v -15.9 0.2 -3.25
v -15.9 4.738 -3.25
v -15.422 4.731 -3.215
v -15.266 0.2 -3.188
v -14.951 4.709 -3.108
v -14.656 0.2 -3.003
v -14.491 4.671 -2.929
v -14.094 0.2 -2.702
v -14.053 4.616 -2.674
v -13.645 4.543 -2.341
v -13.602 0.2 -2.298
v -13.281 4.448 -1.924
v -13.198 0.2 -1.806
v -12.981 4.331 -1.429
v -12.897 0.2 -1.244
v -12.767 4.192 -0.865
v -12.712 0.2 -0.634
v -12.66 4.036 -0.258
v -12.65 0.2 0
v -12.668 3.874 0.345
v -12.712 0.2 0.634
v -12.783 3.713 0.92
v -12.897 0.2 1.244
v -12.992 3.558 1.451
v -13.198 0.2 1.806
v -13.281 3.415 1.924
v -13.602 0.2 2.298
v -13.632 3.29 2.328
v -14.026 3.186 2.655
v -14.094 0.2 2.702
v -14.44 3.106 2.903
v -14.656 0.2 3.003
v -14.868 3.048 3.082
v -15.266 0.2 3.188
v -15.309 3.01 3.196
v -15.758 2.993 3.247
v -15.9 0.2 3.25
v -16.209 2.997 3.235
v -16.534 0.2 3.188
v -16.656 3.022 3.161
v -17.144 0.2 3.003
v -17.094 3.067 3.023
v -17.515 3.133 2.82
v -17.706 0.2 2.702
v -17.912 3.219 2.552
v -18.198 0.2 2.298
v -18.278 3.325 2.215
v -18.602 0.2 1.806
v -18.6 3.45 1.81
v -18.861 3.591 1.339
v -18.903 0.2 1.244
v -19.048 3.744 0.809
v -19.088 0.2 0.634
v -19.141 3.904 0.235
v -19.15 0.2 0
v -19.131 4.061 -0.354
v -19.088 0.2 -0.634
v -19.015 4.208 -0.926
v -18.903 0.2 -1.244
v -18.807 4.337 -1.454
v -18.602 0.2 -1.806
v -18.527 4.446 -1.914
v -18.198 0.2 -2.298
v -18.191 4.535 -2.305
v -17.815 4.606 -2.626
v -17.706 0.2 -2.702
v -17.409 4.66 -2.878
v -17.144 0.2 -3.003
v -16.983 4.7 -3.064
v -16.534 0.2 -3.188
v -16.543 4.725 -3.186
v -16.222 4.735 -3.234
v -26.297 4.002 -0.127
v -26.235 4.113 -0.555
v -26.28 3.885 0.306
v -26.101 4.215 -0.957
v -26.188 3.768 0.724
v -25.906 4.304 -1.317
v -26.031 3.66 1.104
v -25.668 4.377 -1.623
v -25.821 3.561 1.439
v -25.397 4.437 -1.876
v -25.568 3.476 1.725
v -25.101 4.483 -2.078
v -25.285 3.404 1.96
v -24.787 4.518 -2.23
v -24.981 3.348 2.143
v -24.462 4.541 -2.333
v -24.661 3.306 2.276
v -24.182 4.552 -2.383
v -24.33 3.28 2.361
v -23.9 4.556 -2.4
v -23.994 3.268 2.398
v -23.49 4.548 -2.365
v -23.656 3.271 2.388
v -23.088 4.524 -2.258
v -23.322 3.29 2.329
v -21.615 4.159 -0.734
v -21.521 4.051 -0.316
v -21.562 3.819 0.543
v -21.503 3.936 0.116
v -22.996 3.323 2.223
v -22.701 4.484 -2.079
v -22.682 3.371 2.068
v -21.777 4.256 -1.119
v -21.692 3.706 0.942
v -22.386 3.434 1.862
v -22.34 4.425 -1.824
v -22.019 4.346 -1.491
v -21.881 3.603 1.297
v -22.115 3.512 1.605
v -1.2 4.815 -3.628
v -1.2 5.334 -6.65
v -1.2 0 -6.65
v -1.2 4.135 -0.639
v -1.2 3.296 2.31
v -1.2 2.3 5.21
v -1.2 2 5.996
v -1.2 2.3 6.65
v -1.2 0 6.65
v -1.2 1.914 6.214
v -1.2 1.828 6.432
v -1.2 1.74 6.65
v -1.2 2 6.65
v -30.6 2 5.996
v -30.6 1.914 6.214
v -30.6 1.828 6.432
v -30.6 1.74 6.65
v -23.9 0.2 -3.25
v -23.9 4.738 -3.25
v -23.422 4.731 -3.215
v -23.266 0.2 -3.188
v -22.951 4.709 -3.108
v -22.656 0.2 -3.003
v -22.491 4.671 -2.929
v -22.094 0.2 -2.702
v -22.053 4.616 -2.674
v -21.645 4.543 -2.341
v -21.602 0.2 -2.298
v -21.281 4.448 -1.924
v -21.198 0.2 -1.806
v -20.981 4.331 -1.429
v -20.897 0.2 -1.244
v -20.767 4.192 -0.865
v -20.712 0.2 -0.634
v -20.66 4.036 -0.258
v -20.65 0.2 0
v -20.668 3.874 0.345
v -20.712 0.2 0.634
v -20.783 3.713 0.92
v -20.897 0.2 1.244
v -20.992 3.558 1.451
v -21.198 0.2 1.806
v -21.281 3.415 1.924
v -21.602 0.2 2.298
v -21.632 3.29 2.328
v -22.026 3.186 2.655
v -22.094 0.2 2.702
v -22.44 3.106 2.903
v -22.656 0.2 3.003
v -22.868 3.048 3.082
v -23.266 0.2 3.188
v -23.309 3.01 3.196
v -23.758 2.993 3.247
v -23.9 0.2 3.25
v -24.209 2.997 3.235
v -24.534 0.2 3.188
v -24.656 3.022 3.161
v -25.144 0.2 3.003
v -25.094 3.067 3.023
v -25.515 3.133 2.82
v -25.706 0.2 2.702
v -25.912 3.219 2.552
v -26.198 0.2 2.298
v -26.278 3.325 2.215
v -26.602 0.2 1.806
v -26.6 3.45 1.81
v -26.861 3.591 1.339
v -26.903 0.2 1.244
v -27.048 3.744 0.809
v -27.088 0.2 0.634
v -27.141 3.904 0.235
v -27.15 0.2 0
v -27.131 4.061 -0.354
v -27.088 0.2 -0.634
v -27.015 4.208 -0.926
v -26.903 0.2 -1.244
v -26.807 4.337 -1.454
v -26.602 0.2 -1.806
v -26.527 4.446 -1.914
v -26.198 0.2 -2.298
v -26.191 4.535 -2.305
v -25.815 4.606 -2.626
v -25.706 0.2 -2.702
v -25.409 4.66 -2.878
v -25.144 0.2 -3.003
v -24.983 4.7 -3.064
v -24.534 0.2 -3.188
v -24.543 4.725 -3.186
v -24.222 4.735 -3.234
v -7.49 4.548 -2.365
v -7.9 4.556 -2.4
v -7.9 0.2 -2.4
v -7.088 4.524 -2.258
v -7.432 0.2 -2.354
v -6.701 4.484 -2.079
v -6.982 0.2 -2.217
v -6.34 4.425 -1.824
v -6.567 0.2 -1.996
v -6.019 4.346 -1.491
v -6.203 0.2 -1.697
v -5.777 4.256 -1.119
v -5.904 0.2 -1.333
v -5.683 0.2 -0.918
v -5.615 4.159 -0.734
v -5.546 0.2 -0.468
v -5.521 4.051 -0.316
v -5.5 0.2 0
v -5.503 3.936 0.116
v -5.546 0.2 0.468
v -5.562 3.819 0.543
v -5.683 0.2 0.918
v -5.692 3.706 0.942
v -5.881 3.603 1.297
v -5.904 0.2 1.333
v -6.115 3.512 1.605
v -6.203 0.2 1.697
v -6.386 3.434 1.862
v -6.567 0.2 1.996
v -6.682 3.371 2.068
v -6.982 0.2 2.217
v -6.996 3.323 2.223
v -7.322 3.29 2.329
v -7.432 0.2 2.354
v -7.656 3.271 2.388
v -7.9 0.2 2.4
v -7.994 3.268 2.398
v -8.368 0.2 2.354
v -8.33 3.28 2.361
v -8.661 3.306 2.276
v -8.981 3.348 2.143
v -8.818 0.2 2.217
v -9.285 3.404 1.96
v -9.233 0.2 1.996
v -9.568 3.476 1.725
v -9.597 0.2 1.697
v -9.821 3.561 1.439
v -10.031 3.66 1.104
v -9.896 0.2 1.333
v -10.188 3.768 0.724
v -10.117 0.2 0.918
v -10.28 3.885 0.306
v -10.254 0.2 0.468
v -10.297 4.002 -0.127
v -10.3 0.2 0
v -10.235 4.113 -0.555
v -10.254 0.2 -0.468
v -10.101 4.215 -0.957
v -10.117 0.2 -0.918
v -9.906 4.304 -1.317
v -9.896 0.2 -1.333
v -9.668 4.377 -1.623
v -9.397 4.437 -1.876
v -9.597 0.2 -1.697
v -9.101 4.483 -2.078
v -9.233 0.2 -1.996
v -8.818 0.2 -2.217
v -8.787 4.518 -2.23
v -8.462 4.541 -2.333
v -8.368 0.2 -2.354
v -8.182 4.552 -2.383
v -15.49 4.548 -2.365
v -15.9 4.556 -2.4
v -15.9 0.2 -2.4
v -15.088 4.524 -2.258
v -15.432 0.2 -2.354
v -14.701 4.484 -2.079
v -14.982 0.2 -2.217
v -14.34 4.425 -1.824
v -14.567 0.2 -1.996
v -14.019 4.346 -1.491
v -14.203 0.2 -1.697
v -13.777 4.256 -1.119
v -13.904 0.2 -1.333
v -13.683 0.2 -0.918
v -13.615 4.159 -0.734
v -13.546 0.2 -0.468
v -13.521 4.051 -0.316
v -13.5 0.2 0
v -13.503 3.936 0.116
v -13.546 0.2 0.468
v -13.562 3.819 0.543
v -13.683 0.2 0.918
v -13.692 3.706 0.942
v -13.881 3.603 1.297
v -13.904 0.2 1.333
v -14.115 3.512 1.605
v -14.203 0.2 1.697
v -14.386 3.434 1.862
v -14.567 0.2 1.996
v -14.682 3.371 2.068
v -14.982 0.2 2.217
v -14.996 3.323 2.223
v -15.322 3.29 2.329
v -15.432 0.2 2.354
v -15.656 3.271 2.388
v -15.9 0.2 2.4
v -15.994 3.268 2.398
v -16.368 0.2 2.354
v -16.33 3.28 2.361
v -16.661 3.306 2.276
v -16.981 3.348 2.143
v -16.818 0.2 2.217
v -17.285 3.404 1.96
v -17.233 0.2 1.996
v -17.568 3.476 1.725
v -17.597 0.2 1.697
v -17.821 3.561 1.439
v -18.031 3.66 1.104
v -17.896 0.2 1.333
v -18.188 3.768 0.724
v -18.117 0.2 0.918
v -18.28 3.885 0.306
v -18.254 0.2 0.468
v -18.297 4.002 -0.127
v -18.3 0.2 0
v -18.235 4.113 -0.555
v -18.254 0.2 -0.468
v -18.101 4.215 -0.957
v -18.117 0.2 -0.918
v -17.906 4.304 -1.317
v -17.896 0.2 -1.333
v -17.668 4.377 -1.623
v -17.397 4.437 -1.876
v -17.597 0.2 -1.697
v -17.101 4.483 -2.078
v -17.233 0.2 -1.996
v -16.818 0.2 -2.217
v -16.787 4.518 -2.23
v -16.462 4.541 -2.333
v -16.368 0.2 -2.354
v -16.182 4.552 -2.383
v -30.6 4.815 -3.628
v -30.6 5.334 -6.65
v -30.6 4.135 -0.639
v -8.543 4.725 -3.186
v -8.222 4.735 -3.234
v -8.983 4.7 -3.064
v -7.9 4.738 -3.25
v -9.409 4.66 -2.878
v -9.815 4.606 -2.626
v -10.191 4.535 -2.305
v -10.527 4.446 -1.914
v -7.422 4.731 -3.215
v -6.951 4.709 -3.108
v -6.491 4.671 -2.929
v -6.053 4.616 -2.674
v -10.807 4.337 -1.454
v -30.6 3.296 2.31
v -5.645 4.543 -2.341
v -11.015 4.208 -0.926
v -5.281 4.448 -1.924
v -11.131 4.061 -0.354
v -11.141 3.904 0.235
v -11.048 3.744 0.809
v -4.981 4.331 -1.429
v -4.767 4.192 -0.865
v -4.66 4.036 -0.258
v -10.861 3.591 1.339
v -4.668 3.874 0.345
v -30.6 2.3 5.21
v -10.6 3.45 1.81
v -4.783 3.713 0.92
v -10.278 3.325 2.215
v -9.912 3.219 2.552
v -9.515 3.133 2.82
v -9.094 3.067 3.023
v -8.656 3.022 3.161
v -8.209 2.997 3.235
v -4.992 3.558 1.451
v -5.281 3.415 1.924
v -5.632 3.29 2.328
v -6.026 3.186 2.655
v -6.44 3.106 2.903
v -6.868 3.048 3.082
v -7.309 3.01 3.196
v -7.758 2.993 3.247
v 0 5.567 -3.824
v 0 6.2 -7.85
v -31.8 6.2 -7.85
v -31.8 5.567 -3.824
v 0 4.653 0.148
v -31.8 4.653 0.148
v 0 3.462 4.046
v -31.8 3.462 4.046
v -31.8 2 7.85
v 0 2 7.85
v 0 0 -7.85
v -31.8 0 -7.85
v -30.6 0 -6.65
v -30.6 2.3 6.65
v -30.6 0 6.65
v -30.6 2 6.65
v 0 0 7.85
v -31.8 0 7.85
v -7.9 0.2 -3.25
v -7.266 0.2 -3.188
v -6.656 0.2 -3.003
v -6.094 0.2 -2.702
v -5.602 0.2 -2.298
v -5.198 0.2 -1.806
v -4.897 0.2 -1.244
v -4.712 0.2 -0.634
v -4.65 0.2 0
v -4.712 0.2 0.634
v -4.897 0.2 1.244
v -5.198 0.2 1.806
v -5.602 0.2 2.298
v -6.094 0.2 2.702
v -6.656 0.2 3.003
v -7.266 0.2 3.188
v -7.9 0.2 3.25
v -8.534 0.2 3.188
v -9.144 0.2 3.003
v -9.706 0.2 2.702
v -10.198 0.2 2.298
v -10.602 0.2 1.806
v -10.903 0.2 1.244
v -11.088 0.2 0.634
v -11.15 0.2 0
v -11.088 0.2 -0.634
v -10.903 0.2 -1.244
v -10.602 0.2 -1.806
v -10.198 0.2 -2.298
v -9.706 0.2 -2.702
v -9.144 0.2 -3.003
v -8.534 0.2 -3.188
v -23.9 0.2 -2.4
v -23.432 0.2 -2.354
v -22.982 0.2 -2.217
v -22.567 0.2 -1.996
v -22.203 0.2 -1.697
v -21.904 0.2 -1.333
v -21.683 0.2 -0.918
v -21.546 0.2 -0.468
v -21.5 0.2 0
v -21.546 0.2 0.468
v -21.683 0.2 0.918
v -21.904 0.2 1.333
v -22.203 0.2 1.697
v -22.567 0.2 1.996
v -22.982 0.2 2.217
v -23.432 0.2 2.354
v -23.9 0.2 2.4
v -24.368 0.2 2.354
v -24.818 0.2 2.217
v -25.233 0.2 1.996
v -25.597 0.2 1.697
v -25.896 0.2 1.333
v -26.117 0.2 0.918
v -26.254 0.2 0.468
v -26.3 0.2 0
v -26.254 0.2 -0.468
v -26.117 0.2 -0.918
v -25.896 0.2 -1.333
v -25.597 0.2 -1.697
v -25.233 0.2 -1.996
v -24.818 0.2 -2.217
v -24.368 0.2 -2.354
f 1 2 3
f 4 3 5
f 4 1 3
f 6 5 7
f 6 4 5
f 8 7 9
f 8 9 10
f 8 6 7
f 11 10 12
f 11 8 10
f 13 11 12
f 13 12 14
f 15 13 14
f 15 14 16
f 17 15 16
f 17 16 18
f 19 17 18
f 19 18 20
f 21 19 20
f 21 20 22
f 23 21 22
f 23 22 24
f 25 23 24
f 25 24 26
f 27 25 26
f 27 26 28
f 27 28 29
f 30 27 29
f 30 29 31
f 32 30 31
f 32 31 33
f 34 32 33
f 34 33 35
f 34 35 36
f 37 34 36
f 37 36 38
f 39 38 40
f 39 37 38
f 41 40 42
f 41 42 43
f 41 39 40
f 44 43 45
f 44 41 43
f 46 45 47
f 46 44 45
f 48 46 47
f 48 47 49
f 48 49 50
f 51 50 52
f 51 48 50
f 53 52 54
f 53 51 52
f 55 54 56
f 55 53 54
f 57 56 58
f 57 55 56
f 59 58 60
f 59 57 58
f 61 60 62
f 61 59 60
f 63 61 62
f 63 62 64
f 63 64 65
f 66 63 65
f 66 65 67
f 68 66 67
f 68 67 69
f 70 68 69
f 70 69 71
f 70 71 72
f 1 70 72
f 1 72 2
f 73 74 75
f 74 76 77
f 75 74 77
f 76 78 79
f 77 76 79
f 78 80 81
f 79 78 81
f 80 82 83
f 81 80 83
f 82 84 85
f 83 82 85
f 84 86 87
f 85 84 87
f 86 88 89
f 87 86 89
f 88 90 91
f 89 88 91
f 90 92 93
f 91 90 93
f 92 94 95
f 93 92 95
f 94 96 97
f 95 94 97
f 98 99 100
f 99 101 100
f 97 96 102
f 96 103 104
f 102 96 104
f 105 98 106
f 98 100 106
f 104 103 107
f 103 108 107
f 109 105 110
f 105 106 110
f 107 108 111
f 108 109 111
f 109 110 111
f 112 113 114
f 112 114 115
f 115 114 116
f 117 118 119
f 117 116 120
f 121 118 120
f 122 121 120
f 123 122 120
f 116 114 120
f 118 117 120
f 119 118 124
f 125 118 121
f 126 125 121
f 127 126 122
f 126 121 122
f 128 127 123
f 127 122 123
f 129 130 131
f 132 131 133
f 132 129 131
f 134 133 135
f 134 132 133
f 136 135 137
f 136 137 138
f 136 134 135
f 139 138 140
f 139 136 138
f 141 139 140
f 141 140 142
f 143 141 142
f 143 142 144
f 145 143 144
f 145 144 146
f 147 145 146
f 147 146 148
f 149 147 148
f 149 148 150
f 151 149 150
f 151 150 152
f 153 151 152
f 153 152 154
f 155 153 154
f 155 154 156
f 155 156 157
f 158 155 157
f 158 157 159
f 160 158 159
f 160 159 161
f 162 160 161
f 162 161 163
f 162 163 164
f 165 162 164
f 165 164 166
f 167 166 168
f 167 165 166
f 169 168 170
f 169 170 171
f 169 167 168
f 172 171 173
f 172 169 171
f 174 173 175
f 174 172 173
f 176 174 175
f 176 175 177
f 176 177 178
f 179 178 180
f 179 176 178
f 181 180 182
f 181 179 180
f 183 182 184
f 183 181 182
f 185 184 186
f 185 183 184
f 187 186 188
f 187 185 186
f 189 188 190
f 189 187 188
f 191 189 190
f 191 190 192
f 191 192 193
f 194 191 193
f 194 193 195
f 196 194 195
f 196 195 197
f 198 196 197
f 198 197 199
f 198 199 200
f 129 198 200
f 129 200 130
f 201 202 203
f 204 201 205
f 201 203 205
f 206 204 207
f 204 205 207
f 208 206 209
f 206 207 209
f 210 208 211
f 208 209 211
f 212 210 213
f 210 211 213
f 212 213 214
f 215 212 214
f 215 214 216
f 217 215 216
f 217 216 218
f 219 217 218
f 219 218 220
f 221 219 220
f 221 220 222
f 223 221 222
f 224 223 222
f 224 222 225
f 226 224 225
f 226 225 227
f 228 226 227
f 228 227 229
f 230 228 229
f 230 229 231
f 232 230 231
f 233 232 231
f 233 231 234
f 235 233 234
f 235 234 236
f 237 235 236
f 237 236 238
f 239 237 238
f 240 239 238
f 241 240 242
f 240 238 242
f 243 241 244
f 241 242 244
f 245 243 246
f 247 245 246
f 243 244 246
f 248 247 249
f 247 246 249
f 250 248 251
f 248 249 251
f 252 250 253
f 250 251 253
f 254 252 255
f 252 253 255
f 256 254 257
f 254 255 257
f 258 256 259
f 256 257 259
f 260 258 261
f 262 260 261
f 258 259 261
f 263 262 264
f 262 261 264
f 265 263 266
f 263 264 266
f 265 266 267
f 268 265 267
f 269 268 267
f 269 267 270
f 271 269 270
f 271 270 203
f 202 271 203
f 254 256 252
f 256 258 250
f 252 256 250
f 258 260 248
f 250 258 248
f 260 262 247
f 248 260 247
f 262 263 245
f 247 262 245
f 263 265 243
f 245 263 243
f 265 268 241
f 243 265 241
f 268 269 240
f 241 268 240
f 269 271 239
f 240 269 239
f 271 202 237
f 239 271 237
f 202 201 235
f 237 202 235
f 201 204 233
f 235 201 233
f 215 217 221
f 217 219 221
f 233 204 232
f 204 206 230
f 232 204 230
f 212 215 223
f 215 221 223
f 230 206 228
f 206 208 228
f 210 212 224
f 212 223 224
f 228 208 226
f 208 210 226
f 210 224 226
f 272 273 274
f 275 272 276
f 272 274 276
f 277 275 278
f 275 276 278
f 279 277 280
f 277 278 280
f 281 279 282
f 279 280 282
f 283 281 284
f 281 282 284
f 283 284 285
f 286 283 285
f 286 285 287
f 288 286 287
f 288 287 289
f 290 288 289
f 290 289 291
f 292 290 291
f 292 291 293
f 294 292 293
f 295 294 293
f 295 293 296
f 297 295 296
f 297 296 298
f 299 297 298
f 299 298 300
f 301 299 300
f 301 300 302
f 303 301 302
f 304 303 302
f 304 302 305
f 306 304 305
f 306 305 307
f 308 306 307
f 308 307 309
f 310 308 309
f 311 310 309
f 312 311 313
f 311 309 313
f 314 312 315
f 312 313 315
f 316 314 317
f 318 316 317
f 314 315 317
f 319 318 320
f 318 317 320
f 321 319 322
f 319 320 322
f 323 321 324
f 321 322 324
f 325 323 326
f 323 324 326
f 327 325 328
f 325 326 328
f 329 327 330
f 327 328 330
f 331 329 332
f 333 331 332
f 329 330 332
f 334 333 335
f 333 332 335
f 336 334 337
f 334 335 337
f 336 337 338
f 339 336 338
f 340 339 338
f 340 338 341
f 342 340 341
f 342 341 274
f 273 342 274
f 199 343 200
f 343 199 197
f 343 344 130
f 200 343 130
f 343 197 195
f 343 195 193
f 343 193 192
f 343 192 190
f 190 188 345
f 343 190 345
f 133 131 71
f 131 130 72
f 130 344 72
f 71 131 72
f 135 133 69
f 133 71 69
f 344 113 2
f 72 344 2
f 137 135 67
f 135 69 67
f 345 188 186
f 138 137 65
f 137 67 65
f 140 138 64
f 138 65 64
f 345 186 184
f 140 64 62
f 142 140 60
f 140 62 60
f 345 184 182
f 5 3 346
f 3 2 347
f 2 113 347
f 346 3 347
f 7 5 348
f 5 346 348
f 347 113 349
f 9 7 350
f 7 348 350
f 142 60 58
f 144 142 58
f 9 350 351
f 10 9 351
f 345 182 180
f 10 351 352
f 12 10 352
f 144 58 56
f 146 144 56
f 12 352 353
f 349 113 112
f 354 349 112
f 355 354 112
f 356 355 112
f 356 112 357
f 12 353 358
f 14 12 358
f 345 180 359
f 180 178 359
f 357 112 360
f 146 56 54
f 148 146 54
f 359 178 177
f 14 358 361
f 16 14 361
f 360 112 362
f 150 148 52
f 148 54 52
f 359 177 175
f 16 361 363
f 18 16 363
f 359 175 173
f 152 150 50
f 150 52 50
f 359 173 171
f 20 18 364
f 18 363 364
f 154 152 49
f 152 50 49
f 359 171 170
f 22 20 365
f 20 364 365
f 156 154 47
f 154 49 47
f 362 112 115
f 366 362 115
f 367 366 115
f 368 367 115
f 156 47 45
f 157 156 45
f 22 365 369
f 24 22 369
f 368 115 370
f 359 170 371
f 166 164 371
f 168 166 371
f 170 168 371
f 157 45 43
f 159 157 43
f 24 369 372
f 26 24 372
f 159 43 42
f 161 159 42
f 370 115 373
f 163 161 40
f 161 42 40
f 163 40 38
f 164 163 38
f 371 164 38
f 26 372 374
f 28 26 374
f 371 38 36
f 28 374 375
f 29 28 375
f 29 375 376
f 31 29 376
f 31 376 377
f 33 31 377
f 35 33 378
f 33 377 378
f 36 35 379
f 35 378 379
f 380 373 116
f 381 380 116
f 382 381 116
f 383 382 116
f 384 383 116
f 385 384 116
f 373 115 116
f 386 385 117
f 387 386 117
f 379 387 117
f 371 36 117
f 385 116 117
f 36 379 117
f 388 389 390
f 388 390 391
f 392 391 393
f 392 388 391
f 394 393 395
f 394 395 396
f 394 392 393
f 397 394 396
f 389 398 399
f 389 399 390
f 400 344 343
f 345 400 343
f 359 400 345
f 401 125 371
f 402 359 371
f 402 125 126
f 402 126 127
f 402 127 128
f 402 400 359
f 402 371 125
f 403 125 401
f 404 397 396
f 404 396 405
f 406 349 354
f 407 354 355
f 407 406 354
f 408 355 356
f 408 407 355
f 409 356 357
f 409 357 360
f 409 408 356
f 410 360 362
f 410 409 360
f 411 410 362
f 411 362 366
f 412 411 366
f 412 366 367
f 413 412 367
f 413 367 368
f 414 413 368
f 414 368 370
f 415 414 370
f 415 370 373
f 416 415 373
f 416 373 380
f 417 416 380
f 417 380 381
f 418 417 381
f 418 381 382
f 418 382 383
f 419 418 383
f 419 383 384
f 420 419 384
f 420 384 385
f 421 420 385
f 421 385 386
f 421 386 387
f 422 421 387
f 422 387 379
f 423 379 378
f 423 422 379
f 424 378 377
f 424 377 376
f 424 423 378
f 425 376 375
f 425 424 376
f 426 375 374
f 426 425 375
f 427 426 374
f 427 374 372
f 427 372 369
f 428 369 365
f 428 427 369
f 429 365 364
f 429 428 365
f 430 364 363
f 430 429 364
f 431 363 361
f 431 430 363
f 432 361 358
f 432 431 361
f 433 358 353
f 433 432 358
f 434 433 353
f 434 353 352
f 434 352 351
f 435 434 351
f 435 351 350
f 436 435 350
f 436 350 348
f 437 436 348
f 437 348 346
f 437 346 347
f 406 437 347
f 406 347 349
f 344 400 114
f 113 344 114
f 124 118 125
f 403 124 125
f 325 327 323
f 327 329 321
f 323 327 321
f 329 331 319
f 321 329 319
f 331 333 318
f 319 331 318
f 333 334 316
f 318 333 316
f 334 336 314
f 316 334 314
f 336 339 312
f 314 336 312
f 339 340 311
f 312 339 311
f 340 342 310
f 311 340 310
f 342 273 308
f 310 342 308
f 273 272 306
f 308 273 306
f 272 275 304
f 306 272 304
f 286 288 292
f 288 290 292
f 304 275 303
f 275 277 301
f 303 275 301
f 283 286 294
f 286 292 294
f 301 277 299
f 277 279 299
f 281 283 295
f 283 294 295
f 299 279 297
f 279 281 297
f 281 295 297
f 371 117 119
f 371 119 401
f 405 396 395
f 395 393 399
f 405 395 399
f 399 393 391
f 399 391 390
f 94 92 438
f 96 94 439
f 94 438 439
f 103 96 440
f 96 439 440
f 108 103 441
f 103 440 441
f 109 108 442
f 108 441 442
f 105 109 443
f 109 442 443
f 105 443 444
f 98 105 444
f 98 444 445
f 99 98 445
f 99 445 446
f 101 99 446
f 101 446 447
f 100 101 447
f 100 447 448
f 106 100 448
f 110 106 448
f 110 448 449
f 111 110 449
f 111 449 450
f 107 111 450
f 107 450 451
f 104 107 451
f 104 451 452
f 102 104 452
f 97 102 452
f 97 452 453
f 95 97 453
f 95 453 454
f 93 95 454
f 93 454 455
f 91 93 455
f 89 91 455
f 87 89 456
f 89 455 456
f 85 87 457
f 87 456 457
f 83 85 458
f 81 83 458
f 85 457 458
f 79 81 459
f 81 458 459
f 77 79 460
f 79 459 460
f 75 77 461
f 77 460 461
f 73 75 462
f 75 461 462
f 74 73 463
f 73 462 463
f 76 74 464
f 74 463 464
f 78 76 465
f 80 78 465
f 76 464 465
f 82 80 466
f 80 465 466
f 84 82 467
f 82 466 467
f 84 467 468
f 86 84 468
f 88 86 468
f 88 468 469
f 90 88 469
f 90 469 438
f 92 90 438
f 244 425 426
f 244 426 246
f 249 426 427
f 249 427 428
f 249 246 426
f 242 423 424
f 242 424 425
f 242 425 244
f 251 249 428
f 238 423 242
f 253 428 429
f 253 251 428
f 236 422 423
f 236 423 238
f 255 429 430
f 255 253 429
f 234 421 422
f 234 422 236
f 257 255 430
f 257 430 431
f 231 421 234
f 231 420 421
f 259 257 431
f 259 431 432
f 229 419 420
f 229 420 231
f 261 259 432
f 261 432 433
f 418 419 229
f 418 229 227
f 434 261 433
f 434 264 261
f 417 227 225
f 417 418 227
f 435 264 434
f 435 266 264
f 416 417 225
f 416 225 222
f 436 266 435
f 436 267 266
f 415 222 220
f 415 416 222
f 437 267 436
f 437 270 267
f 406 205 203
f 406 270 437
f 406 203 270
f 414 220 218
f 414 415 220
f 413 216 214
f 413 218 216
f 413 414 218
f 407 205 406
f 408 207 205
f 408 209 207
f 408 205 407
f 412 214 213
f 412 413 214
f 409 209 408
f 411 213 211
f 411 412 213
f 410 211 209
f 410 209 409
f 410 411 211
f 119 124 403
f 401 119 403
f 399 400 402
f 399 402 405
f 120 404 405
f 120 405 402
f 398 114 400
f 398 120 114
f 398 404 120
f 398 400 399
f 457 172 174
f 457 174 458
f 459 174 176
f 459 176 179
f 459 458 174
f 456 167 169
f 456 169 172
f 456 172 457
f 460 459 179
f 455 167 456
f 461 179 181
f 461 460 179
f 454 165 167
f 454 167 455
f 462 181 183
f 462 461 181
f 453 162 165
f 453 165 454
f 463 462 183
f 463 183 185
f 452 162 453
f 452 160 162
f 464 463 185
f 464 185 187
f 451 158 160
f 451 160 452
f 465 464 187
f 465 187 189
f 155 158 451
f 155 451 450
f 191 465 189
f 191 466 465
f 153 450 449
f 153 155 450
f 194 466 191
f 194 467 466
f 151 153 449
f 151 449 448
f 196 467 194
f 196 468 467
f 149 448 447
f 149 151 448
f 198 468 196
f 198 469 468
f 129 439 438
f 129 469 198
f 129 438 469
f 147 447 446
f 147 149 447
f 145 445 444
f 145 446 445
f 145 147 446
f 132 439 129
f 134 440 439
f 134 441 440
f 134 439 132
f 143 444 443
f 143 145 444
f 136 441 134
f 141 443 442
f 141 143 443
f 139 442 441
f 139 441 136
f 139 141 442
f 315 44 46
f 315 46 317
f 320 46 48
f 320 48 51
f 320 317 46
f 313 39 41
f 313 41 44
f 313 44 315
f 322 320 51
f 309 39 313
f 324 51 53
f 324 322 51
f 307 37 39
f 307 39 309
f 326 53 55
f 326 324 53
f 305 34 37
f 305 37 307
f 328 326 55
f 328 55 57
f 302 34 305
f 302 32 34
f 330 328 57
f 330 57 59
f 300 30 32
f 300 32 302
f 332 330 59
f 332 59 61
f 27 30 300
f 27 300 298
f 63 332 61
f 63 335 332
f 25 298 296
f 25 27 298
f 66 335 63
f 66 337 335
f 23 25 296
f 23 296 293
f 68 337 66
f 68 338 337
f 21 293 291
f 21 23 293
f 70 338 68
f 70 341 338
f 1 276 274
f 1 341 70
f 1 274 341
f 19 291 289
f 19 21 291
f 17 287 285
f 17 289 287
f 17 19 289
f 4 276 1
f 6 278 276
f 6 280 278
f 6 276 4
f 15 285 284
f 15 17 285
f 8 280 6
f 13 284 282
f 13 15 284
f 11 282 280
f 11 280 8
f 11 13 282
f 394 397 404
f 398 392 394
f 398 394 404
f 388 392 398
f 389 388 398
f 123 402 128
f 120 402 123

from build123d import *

# Parameters (mm, degrees)
BOSS_EXTRUDE1_DEPTH      = 31.8
CUT_EXTRUDE1_REACH       = 35.336
CUT_EXTRUDE1_END_RADIUS  = 57.3
SKETCH2_W                = 29.4
SKETCH2_H                = 13.3
BOSS_EXTRUDE2_REACH      = 35.336
BOSS_EXTRUDE2_END_RADIUS = 57.3
SKETCH3_R                = 3.25
SKETCH3_R_2              = 2.4
SKETCH4_R                = 3.25
SKETCH4_R_2              = 2.4
CUT_EXTRUDE2_DEPTH       = 0.2
LPATTERN1_COUNT          = 2
LPATTERN1_PITCH          = 8
LPATTERN2_COUNT          = 2
LPATTERN2_PITCH          = 8
SKETCH5_W                = 29.4
SKETCH5_H                = 2.5
CUT_EXTRUDE3_DEPTH       = 0.3


with BuildPart() as part:
    # Sketch1 → Boss-Extrude1 (new body)
    with BuildSketch(Plane(origin=(0, 0, 0), x_dir=(0, 0, -1), z_dir=(1, 0, 0))):
        with BuildLine():
            Line((-7.85, 0), (7.85, 0))
            Line((7.85, 0), (7.85, 6.2))
            ThreePointArc((7.85, 6.2), (-0.147838397, 4.652634009), (-7.85, 2))
            Line((-7.85, 2), (-7.85, 0))
        make_face()
    extrude(amount=-BOSS_EXTRUDE1_DEPTH)

    # Cut-Extrude1: up to this cylinder (the profile starts inside it)
    cut_extrude1_end = Plane(origin=(-15.9, -51.377128325, -14.841015221), z_dir=(1, 0, 0)) * Cylinder(CUT_EXTRUDE1_END_RADIUS, 186.272, mode=Mode.PRIVATE)
    # Sketch2 → Cut-Extrude1 (cut, up to the surface)
    with BuildSketch(Plane.XZ, mode=Mode.PRIVATE) as cut_extrude1_sk1:
        with Locations((-15.9, 0)):
            Rectangle(SKETCH2_W, SKETCH2_H)
    cut_extrude1_tool1 = extrude(cut_extrude1_sk1.sketch, amount=-CUT_EXTRUDE1_REACH, mode=Mode.PRIVATE) & cut_extrude1_end
    add(cut_extrude1_tool1.solids().sort_by_distance((-15.9, 0, 0))[0], mode=Mode.SUBTRACT)

    # Boss-Extrude2: up to this cylinder (the profile starts inside it)
    boss_extrude2_end = Plane(origin=(-15.9, -51.377128325, -14.841015221), z_dir=(1, 0, 0)) * Cylinder(BOSS_EXTRUDE2_END_RADIUS, 186.272, mode=Mode.PRIVATE)
    # Sketch3 → Boss-Extrude2 (add, up to the surface)
    with BuildSketch(Plane.XZ, mode=Mode.PRIVATE) as boss_extrude2_sk1:
        with Locations(Location((-15.9, 0, 0), (0, 0, 270))):
            Circle(SKETCH3_R)
        with Locations(Location((-15.9, 0, 0), (0, 0, 270))):
            Circle(SKETCH3_R_2, mode=Mode.SUBTRACT)
    boss_extrude2_tool1 = extrude(boss_extrude2_sk1.sketch, amount=-BOSS_EXTRUDE2_REACH, mode=Mode.PRIVATE) & boss_extrude2_end
    boss_extrude2 = boss_extrude2_tool1.solids().sort_by_distance((-15.9, 0, 3.158076))[0]
    add(boss_extrude2)

    # Sketch4 → Cut-Extrude2 (cut)
    with BuildSketch(Plane.XZ):
        with Locations(Location((-15.9, 0, 0), (0, 0, 270))):
            Circle(SKETCH4_R)
        with Locations(Location((-15.9, 0, 0), (0, 0, 270))):
            Circle(SKETCH4_R_2, mode=Mode.SUBTRACT)
    cut_extrude2 = extrude(amount=-CUT_EXTRUDE2_DEPTH, mode=Mode.SUBTRACT)

    # LPattern1: Boss-Extrude2, Cut-Extrude2 ×2
    with Locations(*[(i * LPATTERN1_PITCH, 0, 0) for i in range(1, LPATTERN1_COUNT)]):
        add(boss_extrude2)
        add(cut_extrude2, mode=Mode.SUBTRACT)

    # LPattern2: Boss-Extrude2, Cut-Extrude2 ×2
    with Locations(*[(-i * LPATTERN2_PITCH, 0, 0) for i in range(1, LPATTERN2_COUNT)]):
        add(boss_extrude2)
        add(cut_extrude2, mode=Mode.SUBTRACT)

    # Sketch5 → Cut-Extrude3 (cut)
    with BuildSketch(Plane(origin=(0, 2, 0), x_dir=(-1, 0, 0), z_dir=(0, -1, 0))):
        with Locations((15.9, -5.4)):
            Rectangle(SKETCH5_W, SKETCH5_H)
    extrude(amount=-CUT_EXTRUDE3_DEPTH, mode=Mode.SUBTRACT)


solid = part.part
